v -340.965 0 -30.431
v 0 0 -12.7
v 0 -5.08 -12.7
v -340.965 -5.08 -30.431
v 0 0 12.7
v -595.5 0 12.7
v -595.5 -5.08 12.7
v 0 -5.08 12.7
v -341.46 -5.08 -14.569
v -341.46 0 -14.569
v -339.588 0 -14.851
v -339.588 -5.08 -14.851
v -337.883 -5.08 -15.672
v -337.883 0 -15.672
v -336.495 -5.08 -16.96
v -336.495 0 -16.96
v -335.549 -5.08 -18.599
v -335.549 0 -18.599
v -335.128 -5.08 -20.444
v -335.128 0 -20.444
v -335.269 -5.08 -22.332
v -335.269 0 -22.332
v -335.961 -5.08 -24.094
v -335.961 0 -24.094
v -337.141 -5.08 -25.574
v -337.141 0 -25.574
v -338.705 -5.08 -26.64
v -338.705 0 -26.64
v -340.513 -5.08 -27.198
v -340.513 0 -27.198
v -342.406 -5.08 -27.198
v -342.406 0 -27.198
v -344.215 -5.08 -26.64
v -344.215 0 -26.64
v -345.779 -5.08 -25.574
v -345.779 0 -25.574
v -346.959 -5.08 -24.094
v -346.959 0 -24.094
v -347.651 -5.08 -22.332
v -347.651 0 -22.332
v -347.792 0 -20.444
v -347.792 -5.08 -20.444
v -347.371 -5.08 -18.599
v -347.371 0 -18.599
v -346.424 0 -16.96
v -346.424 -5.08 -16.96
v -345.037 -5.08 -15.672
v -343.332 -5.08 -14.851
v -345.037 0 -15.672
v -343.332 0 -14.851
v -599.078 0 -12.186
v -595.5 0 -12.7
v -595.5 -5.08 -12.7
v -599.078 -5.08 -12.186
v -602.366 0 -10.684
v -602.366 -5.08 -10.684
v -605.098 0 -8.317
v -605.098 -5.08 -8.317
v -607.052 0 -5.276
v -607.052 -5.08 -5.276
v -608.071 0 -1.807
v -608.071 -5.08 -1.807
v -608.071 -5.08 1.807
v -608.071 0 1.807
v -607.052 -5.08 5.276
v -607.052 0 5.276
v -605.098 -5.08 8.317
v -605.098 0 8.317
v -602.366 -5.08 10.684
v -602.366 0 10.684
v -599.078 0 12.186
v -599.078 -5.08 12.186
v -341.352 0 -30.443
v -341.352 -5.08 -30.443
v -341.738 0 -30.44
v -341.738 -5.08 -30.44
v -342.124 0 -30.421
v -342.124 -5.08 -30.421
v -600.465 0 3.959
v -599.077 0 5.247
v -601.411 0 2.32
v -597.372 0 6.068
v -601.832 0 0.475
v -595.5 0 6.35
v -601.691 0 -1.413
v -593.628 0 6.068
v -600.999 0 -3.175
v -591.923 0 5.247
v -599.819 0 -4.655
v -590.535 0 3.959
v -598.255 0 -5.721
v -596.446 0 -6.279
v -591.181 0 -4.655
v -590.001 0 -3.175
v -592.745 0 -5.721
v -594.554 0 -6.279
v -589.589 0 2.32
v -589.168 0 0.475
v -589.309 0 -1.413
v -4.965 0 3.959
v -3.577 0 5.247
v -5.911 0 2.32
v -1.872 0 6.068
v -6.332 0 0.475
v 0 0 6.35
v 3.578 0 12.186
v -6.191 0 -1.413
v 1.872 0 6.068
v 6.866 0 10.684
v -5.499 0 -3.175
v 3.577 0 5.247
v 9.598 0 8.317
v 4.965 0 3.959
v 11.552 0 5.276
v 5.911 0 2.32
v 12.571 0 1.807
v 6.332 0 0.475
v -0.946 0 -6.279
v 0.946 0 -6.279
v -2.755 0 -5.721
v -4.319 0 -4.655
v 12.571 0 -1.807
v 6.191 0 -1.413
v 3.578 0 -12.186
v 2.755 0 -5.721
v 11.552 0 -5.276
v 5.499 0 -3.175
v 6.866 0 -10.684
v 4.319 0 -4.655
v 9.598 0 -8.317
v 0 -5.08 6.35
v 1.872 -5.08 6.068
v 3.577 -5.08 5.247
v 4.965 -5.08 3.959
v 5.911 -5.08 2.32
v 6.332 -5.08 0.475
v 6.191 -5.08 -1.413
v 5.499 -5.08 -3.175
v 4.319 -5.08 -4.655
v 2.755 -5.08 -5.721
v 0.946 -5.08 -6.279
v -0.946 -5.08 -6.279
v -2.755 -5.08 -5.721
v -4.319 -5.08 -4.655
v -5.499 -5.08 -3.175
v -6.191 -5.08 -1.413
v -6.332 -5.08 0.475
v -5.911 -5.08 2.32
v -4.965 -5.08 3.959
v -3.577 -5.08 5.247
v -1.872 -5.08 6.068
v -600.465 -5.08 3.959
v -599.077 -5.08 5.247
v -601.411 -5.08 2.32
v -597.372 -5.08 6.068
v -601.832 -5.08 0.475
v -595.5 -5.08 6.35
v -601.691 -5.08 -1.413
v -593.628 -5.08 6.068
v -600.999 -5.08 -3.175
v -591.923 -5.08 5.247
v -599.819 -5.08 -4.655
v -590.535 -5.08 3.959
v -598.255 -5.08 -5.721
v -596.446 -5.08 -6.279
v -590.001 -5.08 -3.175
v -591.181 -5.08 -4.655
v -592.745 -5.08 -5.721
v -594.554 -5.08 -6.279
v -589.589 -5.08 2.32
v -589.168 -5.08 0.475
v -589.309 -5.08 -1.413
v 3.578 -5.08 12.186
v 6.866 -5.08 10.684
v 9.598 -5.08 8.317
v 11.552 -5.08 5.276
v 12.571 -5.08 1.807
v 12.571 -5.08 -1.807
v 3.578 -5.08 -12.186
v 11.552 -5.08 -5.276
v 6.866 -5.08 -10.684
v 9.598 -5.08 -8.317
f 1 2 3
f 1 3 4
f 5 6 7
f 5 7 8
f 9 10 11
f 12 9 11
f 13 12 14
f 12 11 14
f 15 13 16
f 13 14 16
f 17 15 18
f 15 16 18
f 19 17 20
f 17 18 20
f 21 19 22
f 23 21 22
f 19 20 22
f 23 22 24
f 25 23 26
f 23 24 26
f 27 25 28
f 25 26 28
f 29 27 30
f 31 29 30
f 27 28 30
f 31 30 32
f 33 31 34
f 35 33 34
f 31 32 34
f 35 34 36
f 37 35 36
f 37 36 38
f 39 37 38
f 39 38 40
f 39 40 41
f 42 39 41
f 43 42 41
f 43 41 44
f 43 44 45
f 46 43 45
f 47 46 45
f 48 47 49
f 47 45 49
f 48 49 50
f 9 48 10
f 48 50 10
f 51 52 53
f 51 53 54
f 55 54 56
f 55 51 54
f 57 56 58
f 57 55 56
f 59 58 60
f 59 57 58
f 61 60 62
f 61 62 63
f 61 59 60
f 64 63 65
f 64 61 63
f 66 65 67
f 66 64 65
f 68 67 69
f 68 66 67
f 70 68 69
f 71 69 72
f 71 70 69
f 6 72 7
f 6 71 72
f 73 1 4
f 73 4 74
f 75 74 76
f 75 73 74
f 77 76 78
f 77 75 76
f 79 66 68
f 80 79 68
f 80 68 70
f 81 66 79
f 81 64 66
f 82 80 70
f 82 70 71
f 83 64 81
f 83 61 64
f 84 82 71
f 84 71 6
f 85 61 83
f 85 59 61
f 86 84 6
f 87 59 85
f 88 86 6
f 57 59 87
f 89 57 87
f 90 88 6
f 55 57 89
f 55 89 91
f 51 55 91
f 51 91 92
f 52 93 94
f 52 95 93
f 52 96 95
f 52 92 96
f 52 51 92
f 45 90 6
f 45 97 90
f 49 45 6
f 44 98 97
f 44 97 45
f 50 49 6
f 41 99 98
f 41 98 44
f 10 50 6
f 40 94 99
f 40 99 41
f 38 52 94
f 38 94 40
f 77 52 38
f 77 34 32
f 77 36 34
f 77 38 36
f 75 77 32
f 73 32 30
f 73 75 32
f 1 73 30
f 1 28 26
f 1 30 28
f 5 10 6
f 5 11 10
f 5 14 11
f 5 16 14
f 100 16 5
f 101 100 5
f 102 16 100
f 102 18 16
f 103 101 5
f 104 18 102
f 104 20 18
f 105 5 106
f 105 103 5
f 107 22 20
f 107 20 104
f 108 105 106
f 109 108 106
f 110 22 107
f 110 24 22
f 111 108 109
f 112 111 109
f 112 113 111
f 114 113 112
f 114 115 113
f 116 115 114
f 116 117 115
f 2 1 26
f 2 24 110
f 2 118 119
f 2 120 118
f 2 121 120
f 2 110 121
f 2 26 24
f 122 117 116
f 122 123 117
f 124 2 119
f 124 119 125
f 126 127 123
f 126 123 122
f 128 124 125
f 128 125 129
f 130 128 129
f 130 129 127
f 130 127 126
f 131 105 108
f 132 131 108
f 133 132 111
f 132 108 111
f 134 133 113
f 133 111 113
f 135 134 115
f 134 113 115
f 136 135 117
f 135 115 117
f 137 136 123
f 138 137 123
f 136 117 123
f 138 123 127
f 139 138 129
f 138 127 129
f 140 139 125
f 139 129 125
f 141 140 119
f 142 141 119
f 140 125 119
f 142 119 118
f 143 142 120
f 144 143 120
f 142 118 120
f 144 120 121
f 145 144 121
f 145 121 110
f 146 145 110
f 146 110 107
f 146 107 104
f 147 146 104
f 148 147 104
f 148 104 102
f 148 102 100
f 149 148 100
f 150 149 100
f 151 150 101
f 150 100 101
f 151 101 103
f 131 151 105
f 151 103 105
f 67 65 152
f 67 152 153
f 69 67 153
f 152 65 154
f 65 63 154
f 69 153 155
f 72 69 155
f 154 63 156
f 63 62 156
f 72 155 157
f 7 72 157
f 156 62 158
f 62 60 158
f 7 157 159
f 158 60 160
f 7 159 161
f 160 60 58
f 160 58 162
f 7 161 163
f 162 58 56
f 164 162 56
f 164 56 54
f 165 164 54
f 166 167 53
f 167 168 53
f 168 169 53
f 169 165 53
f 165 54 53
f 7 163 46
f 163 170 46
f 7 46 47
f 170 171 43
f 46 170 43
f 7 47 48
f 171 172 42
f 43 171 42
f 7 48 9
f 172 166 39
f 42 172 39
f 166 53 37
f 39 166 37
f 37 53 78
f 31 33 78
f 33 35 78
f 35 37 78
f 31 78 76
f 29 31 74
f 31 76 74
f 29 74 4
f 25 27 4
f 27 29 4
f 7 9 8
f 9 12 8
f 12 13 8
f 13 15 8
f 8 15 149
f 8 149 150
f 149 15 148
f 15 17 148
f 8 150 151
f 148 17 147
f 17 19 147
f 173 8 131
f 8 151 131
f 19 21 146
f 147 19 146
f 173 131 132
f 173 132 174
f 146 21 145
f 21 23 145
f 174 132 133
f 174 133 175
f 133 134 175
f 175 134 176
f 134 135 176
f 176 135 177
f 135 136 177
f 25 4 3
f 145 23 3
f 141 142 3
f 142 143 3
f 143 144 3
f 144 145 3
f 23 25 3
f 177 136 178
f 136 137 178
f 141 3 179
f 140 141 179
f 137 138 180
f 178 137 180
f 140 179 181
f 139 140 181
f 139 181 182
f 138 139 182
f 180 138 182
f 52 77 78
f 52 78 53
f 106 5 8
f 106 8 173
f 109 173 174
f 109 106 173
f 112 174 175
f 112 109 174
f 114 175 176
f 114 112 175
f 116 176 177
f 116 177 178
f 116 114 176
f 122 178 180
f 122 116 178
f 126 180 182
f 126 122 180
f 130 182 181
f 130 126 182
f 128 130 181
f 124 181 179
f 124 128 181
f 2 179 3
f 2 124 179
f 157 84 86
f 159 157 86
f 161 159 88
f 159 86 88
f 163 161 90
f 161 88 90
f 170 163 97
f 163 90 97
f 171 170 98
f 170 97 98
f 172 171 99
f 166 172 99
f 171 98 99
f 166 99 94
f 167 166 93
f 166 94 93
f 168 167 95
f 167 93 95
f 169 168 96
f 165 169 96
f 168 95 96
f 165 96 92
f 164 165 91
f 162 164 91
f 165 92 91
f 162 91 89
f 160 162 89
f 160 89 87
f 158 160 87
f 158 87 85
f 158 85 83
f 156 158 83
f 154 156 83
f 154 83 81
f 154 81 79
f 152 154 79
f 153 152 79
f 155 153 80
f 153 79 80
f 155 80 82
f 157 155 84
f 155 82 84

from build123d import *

# Parameters (mm, degrees)
SKETCH2_R           = 6.35
BOSS_EXTRUDE1_DEPTH = 5.08


with BuildPart() as part:
    # Sketch2 → Boss-Extrude1 (new body)
    with BuildSketch(Plane(origin=(0, 0, 0), x_dir=(1, 0, 0), z_dir=(0, 1, 0))):
        with BuildLine():
            Line((-595.5, -12.7), (0, -12.7))
            ThreePointArc((0, -12.7), (12.7, 0), (0, 12.7))
            Line((0, 12.7), (-340.965168315, 30.430994835))
            ThreePointArc((-340.965168315, 30.430994835), (-341.544922169, 30.443467581), (-342.124360605, 30.420637788))
            Line((-342.124360605, 30.420637788), (-595.5, 12.7))
            ThreePointArc((-595.5, 12.7), (-608.2, 0), (-595.5, -12.7))
        make_face()
        with Locations(Location((0, 0, 0), (0, 0, 270))):
            Circle(SKETCH2_R, mode=Mode.SUBTRACT)
        with Locations(Location((-595.5, 0, 0), (0, 0, 270))):
            Circle(SKETCH2_R, mode=Mode.SUBTRACT)
        with Locations(Location((-341.459822451, 20.918847744, 0), (0, 0, 270))):
            Circle(SKETCH2_R, mode=Mode.SUBTRACT)
    extrude(amount=-BOSS_EXTRUDE1_DEPTH)


solid = part.part
